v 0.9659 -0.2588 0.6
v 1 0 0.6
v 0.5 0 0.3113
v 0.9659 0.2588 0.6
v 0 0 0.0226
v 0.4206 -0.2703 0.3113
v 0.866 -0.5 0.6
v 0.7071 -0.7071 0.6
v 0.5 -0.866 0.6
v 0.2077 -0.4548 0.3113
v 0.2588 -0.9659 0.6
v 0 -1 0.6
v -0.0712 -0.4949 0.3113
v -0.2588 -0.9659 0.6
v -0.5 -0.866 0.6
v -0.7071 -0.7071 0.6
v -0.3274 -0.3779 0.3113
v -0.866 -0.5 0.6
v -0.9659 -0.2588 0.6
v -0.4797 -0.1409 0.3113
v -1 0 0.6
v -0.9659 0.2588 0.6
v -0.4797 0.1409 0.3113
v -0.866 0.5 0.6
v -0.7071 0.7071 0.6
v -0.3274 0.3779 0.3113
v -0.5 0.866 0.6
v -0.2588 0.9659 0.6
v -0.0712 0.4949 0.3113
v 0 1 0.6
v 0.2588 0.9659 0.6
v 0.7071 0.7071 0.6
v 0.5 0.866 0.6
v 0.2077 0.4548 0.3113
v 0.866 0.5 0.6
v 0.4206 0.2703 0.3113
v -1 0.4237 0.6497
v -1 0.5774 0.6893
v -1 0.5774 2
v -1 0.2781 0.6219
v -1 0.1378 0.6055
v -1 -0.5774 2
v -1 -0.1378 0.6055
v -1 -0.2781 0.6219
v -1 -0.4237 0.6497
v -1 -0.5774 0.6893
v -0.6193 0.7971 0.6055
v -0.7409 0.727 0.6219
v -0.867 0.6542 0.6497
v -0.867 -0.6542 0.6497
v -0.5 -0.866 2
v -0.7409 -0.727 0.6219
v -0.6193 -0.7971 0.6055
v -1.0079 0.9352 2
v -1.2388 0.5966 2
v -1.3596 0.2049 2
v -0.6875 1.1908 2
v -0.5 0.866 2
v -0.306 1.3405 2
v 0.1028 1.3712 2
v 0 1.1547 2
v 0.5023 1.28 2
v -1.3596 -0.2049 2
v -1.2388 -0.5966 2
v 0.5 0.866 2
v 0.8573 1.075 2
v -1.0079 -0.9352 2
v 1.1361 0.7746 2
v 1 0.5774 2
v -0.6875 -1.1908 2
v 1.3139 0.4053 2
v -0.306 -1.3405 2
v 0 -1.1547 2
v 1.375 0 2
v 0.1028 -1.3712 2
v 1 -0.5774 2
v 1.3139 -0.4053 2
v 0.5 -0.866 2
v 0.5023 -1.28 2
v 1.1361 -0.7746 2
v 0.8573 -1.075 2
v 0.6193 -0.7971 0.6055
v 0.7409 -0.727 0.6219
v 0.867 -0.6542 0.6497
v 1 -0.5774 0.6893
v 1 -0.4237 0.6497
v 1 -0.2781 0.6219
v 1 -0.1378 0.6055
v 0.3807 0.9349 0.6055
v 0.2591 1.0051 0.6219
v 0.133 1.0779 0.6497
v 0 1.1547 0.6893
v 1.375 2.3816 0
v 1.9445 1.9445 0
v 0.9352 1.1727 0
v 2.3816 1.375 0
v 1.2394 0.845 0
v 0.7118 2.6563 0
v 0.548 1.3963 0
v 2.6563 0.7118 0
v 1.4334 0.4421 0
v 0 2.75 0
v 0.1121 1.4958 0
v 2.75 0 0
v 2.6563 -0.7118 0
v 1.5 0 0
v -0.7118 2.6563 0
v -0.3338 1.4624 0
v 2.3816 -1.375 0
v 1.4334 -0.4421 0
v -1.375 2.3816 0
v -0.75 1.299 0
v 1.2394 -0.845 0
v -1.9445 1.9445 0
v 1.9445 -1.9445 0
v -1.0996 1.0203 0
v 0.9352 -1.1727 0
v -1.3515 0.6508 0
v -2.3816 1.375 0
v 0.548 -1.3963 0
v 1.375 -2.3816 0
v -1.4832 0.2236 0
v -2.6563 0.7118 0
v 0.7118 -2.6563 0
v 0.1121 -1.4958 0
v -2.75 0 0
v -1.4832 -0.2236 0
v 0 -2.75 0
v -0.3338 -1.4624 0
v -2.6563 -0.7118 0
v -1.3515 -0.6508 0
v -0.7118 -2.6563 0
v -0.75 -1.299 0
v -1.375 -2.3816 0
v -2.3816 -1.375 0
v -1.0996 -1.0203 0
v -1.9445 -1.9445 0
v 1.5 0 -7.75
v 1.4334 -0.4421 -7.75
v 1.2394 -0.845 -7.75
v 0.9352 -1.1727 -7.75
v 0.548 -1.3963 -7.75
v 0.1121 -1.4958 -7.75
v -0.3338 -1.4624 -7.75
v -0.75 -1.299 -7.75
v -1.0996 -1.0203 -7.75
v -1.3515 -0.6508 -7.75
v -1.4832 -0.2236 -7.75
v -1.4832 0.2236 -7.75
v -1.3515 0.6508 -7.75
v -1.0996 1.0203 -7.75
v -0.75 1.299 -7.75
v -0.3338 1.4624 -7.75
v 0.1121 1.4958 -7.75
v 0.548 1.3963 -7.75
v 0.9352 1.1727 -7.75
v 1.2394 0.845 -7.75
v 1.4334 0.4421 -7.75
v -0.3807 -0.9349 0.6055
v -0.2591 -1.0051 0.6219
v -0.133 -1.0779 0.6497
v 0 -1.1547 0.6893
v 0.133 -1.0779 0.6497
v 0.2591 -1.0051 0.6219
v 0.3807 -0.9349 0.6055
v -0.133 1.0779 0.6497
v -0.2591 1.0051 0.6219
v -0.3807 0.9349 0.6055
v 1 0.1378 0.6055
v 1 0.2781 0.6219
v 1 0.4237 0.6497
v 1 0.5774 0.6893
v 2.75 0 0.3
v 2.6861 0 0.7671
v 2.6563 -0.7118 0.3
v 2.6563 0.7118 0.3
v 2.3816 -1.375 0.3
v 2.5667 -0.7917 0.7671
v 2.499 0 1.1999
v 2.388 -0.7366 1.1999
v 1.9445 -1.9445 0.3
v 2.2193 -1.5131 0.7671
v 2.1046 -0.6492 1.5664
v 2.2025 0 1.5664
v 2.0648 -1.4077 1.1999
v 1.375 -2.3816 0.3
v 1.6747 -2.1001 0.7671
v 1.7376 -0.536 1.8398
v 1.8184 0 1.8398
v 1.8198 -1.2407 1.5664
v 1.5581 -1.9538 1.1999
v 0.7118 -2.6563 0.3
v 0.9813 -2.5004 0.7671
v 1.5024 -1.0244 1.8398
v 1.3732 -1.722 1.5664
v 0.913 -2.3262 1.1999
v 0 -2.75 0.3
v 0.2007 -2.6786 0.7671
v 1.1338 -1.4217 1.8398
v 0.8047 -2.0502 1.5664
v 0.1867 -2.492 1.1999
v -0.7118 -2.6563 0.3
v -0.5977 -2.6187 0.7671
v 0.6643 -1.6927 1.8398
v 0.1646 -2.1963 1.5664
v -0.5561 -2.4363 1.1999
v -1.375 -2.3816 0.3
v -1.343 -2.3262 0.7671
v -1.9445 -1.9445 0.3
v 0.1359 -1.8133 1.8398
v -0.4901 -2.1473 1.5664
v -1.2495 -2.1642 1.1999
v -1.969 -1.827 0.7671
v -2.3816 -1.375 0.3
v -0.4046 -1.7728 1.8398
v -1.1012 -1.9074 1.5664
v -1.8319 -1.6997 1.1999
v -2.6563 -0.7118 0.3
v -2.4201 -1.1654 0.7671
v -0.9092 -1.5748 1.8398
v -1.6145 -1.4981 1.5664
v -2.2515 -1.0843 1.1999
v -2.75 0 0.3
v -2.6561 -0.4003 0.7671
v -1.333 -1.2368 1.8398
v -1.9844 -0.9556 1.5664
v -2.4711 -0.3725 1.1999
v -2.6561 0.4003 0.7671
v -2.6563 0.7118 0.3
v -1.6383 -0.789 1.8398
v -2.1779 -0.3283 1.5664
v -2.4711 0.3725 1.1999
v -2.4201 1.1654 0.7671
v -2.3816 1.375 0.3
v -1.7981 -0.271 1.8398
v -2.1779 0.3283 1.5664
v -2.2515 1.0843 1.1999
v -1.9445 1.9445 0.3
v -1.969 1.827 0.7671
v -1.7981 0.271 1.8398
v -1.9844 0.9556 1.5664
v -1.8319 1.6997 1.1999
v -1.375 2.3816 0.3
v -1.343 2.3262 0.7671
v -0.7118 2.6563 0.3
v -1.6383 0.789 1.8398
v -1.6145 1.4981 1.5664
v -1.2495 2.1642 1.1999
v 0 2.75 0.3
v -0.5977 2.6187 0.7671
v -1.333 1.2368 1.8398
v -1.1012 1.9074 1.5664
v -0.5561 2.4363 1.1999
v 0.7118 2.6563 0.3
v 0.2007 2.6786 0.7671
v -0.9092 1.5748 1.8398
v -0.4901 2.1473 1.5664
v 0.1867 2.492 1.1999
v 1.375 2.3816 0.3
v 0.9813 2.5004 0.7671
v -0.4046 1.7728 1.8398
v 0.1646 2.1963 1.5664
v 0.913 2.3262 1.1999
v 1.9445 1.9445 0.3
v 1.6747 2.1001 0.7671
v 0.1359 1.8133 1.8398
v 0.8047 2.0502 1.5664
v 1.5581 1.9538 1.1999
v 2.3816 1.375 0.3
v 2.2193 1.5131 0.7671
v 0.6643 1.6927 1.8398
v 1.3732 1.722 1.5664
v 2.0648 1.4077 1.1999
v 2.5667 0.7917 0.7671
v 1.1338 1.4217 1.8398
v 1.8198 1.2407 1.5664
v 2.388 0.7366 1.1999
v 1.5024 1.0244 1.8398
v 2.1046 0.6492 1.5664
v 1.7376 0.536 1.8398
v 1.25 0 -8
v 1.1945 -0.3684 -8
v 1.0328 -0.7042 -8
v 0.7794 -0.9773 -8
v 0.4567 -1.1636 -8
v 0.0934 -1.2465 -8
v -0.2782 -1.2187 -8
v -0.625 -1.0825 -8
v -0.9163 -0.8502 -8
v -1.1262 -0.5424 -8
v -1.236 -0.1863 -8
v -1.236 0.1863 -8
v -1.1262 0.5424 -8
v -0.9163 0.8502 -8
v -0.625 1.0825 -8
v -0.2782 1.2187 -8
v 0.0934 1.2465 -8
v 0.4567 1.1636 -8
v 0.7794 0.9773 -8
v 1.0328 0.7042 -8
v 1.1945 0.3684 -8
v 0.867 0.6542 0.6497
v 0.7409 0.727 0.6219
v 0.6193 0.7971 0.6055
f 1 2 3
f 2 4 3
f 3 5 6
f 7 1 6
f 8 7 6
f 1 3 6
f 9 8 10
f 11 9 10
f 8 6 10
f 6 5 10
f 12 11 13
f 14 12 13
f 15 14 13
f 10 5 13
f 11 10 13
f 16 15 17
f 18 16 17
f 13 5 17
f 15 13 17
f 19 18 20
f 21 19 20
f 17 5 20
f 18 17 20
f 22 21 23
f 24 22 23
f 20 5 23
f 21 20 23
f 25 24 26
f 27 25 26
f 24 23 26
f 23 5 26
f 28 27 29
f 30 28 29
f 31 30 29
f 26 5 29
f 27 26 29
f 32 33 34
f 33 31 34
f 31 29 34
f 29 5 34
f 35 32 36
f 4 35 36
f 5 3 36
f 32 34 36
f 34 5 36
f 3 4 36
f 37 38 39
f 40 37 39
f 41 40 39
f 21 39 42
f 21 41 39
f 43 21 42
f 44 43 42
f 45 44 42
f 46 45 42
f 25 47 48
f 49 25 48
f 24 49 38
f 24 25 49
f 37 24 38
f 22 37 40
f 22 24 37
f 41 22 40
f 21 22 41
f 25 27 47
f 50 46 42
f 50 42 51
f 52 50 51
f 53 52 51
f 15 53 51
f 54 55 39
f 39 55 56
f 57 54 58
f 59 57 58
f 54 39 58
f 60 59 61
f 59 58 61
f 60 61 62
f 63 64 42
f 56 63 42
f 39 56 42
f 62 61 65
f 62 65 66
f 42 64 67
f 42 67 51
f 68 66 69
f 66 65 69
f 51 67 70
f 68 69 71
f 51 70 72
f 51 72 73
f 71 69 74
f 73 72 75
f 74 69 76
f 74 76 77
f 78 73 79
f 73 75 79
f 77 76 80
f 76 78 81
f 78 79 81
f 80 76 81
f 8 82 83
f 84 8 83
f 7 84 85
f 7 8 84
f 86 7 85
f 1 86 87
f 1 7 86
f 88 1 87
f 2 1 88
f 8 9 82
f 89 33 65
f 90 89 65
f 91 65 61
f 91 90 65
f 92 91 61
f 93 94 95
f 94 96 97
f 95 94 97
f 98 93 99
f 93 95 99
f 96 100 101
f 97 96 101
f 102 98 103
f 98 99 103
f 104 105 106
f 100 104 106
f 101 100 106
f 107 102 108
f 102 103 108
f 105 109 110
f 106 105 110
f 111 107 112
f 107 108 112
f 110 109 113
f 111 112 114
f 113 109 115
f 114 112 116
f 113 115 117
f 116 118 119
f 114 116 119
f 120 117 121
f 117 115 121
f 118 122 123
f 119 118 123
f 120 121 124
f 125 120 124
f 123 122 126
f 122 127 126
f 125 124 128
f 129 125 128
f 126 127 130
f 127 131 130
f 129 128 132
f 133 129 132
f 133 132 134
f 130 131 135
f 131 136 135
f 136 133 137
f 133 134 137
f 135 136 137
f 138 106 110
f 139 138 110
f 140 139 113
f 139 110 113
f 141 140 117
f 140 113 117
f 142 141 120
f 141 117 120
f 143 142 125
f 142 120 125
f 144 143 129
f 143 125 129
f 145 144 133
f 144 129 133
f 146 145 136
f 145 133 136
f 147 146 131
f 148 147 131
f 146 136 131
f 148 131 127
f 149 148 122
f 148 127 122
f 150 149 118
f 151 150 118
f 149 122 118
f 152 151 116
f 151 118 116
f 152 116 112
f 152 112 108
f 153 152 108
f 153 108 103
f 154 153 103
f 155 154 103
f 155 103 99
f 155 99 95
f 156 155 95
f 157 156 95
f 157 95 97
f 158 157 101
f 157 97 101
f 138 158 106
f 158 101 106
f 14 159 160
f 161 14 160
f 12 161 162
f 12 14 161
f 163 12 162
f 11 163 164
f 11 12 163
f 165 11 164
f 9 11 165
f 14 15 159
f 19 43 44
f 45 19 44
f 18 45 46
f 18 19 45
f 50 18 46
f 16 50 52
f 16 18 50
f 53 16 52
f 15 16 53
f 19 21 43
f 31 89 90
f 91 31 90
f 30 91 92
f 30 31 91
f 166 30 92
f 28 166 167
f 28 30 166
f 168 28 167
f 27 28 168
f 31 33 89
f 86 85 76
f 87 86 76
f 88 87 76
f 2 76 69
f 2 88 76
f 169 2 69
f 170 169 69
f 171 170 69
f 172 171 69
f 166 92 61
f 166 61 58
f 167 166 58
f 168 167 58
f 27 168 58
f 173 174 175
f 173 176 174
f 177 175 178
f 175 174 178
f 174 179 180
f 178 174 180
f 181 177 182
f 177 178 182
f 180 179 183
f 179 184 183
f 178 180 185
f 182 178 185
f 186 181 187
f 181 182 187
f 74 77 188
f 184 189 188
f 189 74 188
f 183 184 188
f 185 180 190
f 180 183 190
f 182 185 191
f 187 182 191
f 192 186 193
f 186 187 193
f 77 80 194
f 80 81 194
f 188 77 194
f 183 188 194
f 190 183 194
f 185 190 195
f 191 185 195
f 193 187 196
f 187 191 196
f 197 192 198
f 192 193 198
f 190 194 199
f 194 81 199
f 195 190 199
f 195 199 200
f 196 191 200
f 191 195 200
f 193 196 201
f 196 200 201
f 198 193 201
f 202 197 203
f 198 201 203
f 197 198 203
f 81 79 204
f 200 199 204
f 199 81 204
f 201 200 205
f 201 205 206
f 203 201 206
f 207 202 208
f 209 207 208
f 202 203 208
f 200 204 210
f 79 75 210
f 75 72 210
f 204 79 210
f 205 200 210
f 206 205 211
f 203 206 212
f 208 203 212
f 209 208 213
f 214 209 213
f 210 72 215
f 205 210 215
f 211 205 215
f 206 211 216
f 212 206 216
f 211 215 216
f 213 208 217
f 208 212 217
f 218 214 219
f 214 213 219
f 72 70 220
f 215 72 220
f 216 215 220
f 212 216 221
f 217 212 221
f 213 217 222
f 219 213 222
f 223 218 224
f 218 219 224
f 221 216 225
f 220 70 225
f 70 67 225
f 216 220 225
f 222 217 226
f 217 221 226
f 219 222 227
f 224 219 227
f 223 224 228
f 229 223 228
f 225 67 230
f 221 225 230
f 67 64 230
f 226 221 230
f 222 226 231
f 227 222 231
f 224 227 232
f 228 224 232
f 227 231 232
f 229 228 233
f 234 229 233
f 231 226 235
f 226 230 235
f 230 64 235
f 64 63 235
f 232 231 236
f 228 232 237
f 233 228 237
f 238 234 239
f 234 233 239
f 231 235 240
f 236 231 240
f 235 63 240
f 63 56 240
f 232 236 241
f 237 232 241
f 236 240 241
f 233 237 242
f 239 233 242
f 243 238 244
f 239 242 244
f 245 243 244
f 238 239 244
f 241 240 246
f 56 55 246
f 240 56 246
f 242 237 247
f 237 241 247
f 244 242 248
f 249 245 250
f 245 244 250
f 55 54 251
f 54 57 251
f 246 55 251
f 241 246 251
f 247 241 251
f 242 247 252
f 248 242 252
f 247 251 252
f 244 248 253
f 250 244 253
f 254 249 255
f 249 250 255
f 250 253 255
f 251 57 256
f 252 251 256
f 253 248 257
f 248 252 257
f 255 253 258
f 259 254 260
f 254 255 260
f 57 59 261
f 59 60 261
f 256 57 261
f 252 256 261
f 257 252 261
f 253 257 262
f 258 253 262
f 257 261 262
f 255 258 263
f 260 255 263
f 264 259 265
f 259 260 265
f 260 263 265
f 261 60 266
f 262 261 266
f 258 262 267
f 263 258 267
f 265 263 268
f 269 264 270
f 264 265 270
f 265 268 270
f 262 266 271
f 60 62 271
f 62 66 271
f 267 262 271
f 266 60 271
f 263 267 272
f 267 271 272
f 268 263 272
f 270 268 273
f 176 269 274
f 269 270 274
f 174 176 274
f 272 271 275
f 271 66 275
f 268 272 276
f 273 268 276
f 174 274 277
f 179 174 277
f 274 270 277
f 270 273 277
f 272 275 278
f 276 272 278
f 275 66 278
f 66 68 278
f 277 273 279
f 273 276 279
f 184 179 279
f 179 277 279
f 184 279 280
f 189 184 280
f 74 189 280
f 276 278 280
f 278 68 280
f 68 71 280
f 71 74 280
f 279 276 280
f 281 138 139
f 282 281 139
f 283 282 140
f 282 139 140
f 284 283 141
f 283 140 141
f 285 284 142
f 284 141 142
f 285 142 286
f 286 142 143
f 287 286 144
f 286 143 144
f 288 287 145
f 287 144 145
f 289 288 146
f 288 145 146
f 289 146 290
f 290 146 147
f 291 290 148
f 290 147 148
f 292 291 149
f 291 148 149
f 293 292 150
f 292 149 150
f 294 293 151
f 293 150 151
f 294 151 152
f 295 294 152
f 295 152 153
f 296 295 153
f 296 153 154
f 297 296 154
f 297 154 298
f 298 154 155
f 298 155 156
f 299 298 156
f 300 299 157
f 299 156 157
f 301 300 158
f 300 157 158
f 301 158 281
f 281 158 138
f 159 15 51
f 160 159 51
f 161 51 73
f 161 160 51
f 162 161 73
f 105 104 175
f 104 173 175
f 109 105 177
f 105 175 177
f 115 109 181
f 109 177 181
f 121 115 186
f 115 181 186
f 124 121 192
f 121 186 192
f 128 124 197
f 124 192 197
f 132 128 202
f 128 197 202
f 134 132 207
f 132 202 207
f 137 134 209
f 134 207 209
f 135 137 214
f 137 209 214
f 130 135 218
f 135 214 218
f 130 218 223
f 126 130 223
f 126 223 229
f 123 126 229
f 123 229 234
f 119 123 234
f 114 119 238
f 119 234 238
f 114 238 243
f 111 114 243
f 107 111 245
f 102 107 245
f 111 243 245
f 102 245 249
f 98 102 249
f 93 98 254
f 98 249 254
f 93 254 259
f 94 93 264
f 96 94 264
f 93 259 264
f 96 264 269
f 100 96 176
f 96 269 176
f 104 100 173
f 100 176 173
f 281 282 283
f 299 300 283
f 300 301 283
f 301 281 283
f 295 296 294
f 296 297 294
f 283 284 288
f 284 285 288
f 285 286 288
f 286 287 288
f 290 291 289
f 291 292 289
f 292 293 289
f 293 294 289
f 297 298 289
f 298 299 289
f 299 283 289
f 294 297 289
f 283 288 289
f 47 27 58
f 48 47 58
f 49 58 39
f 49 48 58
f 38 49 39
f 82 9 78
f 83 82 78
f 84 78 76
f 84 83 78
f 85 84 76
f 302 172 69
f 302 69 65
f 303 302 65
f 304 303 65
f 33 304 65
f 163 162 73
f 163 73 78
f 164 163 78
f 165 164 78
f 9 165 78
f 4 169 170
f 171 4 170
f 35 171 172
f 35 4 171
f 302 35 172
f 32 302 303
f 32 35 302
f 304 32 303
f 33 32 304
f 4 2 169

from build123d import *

# Parameters (mm, degrees)
CHAMFER1_SIZE      = 0.25
CUT_EXTRUDE1_REACH = 12.73


with BuildPart() as part:
    # Sketch2 → Revolve1 (revolve)
    with BuildSketch(Plane(origin=(0, 0, 0), x_dir=(0, 0, -1), z_dir=(1, 0, 0))):
        with BuildLine():
            Line((8, 0), (8, 1.5))
            Line((8, 1.5), (0, 1.5))
            Line((0, 1.5), (0, 2.75))
            Line((0, 2.75), (-0.3, 2.75))
            ThreePointArc((-0.3, 2.75), (-1.39323202, 2.363223225), (-2, 1.375))
            Line((-2, 1.375), (-2, 0))
            Line((-2, 0), (8, 0))
        make_face()
    revolve(axis=Axis((0, 0, 14.771903323), (0, 0, -1)))

    # Chamfer1
    chamfer1_edges = [part.edges().sort_by_distance(p)[0] for p in [
        (0, -1.5, -8),
    ]]
    chamfer(chamfer1_edges, length=CHAMFER1_SIZE)

    # Sketch3 → Cut-Revolve1 (revolve, cut)
    with BuildSketch(Plane(origin=(0, 0, 0), x_dir=(0, 0, -1), z_dir=(1, 0, 0))):
        Polygon((-2, 0), (-2, 1), (-0.6, 1), (-0.022649731, 0), align=None)
    revolve(axis=Axis((0, 0, 1.261909675), (0, 0, -1)), mode=Mode.SUBTRACT)

    # Cut-Extrude1: up to this cone (the profile starts inside it)
    cut_extrude1_end = Plane(origin=(0, 0, 2), z_dir=(0, 0, 1)).offset(-1.977349269) * Cone(1.732e-06, 32.271954122, 18.6322204, align=(Align.CENTER, Align.CENTER, Align.MIN), mode=Mode.PRIVATE)
    # Sketch4 → Cut-Extrude1 (cut, up to the surface)
    with BuildSketch(Plane.XY.offset(2), mode=Mode.PRIVATE) as cut_extrude1_sk1:
        Polygon((0, 1.154700538), (-1, 0.577350269), (-1, -0.577350269), (0, -1.154700538), (1, -0.577350269), (1, 0.577350269), align=None)
    cut_extrude1_tool1 = extrude(cut_extrude1_sk1.sketch, amount=-CUT_EXTRUDE1_REACH, mode=Mode.PRIVATE) & cut_extrude1_end
    add(cut_extrude1_tool1.solids().sort_by_distance((0, 0, 2))[0], mode=Mode.SUBTRACT)


solid = part.part
